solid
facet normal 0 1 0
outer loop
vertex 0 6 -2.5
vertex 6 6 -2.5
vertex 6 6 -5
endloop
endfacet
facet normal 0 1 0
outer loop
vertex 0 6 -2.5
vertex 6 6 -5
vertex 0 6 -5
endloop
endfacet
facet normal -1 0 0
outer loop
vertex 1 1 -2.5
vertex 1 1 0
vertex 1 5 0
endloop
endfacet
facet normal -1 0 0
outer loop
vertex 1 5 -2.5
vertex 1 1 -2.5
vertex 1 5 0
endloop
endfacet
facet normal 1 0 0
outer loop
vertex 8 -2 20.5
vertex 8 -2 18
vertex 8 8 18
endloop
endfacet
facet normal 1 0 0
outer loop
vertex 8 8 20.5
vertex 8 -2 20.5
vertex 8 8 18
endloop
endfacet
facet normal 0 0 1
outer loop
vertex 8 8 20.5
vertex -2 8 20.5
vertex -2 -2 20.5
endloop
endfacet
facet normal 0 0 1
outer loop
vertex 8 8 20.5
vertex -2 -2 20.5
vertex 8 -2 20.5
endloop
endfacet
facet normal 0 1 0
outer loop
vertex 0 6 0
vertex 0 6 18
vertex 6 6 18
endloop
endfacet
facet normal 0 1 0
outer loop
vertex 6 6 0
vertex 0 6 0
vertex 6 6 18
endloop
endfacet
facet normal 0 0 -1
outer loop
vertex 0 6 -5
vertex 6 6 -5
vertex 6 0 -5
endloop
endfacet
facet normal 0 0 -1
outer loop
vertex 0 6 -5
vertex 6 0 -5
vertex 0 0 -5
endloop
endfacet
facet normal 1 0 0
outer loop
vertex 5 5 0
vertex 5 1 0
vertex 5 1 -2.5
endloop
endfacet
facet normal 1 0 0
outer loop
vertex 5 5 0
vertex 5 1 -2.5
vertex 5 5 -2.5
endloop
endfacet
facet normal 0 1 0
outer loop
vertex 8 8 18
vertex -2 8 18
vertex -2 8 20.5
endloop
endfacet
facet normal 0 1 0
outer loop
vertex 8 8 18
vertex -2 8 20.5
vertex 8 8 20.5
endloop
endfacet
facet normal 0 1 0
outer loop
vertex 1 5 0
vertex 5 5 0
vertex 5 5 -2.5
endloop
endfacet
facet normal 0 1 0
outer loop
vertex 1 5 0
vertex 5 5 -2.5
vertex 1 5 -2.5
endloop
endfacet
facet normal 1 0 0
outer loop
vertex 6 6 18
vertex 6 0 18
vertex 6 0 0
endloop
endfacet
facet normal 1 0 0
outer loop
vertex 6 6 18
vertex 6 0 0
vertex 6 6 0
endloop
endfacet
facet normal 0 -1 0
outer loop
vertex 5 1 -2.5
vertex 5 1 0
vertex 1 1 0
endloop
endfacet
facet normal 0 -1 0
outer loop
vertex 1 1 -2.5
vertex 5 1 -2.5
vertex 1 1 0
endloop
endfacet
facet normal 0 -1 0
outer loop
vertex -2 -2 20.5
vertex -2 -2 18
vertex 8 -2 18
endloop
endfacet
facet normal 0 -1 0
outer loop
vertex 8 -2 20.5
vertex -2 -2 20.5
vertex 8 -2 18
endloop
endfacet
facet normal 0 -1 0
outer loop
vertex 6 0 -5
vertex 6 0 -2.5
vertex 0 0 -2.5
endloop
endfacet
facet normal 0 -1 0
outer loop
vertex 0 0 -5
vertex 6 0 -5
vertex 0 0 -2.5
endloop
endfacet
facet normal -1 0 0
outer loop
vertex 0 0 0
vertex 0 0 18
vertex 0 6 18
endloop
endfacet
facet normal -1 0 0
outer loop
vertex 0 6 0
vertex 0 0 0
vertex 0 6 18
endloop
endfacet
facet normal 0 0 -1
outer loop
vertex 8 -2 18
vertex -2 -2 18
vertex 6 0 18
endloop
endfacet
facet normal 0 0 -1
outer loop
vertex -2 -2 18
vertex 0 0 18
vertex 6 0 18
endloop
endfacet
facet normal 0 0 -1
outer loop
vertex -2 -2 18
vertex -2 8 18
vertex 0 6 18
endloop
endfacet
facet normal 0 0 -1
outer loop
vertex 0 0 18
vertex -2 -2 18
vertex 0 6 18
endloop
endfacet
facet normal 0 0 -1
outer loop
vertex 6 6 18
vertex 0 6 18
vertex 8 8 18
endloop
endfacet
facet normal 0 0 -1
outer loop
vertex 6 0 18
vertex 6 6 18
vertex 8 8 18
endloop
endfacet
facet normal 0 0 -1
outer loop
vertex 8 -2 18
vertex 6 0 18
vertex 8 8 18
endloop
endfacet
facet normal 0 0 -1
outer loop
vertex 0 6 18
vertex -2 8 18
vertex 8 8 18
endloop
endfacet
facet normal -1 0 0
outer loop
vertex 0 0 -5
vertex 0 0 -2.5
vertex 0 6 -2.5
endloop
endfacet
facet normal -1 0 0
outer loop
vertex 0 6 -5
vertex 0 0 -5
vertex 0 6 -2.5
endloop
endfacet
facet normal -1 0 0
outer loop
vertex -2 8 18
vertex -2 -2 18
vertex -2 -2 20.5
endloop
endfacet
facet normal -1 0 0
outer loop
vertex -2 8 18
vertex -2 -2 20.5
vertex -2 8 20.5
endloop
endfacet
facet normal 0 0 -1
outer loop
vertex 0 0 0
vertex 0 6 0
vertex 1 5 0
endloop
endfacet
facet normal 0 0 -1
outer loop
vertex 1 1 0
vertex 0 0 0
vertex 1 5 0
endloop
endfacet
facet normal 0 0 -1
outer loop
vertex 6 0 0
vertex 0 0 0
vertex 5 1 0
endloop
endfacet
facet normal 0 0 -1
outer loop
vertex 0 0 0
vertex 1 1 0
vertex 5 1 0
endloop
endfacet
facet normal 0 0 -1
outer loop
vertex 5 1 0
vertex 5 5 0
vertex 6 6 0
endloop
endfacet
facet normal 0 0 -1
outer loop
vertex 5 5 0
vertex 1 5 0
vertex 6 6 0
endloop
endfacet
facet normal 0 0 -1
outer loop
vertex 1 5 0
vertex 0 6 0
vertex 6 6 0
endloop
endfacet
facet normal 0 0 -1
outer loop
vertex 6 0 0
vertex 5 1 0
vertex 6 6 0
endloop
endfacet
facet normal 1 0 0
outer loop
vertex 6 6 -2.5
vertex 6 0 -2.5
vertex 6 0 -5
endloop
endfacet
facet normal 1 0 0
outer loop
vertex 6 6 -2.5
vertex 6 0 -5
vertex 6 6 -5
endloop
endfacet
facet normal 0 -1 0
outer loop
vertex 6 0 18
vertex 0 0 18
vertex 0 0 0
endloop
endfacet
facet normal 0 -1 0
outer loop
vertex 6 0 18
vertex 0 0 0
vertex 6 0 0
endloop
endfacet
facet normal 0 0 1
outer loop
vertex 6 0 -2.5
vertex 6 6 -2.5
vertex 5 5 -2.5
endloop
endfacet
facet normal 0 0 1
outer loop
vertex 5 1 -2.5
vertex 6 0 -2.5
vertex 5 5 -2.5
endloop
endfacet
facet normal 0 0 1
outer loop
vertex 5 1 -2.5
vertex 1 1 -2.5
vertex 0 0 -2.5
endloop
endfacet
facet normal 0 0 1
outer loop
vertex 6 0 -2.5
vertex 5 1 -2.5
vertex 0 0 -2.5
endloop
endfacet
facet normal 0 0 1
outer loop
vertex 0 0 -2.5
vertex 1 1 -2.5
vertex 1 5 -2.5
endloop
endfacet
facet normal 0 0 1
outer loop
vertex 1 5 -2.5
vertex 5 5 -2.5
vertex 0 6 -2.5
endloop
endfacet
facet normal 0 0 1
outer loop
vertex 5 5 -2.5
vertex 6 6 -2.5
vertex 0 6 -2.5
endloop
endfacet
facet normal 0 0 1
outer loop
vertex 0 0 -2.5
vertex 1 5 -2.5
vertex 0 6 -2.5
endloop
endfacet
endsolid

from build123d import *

# Parameters (mm, degrees)
SKETCH1_W           = 6
SKETCH1_H           = 6
BOSS_EXTRUDE1_DEPTH = 18
SKETCH2_W           = 10
SKETCH2_H           = 10
BOSS_EXTRUDE2_DEPTH = 2.5
SKETCH5_W           = 4
SKETCH5_H           = 4
BOSS_EXTRUDE4_DEPTH = 2.5
SKETCH6_W           = 6
SKETCH6_H           = 6
BOSS_EXTRUDE5_DEPTH = 2.5


with BuildPart() as part:
    # Sketch1 → Boss-Extrude1 (new body)
    with BuildSketch(Plane.XY):
        with Locations((3, 3)):
            Rectangle(SKETCH1_W, SKETCH1_H)
    extrude(amount=BOSS_EXTRUDE1_DEPTH)

    # Sketch2 → Boss-Extrude2 (add)
    with BuildSketch(Plane.XY.offset(18)):
        with Locations((3, 3)):
            Rectangle(SKETCH2_W, SKETCH2_H)
    extrude(amount=BOSS_EXTRUDE2_DEPTH)

    # Sketch5 → Boss-Extrude4 (add)
    with BuildSketch(Plane(origin=(0, 0, 0), x_dir=(-1, 0, 0), z_dir=(0, 0, -1))):
        with Locations((-3, 3)):
            Rectangle(SKETCH5_W, SKETCH5_H)
    extrude(amount=BOSS_EXTRUDE4_DEPTH)

    # Sketch6 → Boss-Extrude5 (add)
    with BuildSketch(Plane(origin=(0, 0, -2.5), x_dir=(-1, 0, 0), z_dir=(0, 0, -1))):
        with Locations((-3, 3)):
            Rectangle(SKETCH6_W, SKETCH6_H)
    extrude(amount=BOSS_EXTRUDE5_DEPTH)


solid = part.part
